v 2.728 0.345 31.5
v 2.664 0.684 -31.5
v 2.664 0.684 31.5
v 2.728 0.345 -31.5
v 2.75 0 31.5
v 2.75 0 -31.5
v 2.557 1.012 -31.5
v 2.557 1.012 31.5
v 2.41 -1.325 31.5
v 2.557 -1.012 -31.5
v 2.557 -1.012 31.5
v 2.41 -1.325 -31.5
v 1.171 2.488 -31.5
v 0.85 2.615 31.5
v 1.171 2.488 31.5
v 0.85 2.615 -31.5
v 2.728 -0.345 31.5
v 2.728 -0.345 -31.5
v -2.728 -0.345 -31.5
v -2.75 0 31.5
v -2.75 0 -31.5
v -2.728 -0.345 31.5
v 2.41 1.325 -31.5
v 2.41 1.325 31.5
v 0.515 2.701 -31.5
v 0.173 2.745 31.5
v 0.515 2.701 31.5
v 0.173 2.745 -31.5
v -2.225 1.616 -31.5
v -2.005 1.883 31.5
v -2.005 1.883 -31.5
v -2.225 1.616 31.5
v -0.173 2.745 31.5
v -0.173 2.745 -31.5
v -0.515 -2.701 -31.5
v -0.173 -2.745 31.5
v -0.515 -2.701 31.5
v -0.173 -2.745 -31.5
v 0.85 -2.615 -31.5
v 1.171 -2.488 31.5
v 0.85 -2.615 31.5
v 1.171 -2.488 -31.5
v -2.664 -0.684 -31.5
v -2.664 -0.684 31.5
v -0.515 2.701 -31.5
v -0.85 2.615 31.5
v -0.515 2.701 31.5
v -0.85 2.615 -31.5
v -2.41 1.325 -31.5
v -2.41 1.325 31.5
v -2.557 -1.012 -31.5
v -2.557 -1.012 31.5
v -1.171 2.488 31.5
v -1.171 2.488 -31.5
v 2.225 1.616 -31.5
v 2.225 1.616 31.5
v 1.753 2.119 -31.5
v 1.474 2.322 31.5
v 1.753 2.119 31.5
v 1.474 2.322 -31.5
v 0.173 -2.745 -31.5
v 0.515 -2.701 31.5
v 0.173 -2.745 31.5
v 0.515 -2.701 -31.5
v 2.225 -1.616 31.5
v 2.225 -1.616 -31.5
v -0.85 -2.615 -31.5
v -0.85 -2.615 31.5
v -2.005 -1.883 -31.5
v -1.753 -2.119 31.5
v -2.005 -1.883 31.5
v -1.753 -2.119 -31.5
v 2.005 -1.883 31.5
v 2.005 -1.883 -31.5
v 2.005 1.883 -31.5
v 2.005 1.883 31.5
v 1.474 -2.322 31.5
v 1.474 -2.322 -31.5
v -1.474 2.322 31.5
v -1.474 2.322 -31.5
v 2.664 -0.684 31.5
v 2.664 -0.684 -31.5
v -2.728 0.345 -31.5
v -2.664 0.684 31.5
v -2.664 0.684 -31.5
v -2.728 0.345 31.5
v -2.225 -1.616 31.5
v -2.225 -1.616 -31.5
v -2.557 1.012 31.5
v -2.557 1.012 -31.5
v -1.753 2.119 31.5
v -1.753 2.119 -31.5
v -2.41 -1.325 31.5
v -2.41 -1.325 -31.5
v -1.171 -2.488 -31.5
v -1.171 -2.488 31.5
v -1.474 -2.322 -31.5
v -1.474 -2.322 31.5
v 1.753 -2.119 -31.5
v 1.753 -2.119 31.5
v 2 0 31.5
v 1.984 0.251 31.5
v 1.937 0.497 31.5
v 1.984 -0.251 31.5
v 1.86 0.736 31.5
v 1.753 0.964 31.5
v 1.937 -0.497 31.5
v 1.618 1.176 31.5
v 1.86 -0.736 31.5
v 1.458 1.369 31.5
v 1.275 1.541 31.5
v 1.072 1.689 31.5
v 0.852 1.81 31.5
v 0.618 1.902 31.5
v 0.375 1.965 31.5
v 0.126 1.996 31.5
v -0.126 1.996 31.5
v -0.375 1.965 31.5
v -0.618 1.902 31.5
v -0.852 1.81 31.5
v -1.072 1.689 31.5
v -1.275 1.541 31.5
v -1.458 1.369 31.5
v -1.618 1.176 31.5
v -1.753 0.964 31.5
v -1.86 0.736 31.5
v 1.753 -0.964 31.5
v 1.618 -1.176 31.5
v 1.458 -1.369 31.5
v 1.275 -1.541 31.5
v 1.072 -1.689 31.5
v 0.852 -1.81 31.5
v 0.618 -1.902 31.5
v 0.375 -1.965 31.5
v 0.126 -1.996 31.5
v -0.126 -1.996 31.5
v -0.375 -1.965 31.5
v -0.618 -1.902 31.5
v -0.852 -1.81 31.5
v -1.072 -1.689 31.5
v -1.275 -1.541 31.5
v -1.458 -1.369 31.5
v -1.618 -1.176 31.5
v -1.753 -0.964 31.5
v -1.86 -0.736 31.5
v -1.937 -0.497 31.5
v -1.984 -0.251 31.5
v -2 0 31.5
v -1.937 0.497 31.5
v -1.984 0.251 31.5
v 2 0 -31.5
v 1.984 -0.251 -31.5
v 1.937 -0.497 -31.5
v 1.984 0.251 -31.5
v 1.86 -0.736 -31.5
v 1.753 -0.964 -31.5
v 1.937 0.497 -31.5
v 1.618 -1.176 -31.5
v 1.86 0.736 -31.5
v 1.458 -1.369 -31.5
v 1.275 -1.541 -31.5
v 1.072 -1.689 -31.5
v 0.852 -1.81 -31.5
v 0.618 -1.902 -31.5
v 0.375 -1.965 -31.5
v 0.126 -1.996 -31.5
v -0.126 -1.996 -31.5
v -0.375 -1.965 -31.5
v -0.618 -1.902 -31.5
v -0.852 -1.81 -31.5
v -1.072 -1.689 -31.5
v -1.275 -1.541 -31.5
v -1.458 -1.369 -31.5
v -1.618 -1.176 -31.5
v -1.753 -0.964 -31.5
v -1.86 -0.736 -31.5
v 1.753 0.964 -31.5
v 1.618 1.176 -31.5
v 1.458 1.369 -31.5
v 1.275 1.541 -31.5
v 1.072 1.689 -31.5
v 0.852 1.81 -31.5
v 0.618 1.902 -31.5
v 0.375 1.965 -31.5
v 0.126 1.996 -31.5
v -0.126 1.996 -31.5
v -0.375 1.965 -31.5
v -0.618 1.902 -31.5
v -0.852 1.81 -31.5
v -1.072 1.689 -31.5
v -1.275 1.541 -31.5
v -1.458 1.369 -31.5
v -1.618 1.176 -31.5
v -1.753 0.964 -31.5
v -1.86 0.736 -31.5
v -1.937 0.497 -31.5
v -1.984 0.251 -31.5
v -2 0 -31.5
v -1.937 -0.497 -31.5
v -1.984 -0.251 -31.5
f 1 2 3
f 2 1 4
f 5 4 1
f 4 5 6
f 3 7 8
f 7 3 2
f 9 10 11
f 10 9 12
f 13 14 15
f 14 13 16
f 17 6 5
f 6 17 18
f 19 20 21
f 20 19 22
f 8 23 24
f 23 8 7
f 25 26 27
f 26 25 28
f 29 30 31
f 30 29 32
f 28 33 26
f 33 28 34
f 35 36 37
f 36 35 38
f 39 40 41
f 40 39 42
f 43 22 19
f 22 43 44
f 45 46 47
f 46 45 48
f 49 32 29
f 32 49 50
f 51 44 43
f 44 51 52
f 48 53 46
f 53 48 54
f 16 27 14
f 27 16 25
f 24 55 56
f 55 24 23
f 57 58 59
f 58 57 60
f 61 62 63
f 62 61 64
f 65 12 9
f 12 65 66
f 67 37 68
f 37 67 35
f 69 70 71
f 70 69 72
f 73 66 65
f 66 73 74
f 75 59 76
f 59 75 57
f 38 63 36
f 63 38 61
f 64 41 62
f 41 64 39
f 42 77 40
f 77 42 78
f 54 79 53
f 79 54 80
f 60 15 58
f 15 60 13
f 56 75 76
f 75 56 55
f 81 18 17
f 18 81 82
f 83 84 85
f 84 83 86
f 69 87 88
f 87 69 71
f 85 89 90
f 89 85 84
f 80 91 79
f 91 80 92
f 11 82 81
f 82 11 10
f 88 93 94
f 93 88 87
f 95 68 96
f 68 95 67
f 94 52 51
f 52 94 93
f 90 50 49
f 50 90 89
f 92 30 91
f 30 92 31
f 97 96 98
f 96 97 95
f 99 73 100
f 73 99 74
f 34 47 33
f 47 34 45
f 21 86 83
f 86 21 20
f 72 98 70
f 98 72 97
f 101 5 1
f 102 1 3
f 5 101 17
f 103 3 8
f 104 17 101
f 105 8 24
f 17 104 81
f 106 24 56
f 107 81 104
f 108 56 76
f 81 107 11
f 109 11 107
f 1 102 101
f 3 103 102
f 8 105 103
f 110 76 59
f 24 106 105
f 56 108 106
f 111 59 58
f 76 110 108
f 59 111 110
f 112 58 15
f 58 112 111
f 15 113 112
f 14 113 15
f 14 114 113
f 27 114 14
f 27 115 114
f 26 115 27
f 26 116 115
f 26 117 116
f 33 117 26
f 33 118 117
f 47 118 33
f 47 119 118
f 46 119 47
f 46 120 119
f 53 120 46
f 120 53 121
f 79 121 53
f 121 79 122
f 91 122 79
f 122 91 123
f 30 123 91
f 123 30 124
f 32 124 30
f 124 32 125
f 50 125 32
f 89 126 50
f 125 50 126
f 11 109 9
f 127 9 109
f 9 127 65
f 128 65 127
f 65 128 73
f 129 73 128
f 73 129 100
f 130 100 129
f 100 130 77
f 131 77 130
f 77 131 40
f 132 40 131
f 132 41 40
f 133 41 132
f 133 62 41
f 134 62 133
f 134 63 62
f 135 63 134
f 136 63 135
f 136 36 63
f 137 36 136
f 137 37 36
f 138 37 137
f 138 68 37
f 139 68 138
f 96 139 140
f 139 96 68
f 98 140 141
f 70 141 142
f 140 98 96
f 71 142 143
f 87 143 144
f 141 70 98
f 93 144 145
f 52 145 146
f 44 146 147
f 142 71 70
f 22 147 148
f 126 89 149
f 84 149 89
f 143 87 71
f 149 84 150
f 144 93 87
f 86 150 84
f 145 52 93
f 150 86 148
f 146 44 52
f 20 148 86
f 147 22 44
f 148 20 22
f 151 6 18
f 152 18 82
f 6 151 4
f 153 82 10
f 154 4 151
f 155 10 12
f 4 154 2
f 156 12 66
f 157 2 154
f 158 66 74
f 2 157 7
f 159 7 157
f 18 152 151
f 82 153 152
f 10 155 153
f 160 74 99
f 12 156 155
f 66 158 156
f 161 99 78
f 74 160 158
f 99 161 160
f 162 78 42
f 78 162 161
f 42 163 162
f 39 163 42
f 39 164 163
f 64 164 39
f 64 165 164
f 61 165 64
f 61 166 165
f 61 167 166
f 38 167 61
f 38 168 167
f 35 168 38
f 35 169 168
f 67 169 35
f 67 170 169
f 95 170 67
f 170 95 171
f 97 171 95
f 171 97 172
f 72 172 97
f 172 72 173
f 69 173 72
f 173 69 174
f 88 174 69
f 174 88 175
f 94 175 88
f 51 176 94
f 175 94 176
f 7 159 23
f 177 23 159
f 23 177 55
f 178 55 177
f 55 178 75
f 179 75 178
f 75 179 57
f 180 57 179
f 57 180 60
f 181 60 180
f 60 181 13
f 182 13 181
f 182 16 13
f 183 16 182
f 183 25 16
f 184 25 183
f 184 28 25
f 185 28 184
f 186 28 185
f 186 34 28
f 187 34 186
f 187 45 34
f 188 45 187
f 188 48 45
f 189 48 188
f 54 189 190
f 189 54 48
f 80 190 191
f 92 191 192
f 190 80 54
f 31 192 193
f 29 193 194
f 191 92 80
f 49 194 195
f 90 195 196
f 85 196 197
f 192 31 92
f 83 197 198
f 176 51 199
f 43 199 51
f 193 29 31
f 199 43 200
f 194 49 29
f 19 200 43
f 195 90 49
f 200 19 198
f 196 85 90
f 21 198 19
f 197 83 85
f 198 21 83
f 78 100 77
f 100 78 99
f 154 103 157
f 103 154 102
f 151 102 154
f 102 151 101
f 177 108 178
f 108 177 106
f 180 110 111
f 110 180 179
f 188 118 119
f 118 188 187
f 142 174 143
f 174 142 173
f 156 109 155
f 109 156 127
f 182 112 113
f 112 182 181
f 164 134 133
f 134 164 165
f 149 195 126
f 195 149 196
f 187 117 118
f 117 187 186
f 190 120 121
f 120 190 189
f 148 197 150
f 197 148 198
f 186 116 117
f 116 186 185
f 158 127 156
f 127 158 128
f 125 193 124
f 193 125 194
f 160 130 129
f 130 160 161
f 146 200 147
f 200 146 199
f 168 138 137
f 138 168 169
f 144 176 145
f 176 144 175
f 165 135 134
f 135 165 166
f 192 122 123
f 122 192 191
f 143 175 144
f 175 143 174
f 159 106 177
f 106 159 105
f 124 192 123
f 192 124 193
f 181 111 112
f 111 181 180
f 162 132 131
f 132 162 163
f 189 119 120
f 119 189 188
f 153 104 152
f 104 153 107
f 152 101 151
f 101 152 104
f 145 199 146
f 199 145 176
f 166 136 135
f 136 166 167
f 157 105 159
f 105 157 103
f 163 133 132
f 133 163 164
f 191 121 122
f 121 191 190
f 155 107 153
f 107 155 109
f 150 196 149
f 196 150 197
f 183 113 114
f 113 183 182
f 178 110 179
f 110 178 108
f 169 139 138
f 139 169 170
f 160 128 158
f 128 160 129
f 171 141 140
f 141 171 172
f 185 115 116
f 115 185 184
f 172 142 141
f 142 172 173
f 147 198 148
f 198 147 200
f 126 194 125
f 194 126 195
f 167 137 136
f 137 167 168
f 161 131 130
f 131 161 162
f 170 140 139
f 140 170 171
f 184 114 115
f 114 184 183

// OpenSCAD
$fn = 50;


difference() {
	union() {
		translate(v = [0, 0, -31.5000000000]) {
			cylinder(h = 63, r = 2.7500000000);
		}
	}
	union() {
		translate(v = [0, 0, -100.0000000000]) {
			cylinder(h = 200, r = 2.0000000000);
		}
	}
}
